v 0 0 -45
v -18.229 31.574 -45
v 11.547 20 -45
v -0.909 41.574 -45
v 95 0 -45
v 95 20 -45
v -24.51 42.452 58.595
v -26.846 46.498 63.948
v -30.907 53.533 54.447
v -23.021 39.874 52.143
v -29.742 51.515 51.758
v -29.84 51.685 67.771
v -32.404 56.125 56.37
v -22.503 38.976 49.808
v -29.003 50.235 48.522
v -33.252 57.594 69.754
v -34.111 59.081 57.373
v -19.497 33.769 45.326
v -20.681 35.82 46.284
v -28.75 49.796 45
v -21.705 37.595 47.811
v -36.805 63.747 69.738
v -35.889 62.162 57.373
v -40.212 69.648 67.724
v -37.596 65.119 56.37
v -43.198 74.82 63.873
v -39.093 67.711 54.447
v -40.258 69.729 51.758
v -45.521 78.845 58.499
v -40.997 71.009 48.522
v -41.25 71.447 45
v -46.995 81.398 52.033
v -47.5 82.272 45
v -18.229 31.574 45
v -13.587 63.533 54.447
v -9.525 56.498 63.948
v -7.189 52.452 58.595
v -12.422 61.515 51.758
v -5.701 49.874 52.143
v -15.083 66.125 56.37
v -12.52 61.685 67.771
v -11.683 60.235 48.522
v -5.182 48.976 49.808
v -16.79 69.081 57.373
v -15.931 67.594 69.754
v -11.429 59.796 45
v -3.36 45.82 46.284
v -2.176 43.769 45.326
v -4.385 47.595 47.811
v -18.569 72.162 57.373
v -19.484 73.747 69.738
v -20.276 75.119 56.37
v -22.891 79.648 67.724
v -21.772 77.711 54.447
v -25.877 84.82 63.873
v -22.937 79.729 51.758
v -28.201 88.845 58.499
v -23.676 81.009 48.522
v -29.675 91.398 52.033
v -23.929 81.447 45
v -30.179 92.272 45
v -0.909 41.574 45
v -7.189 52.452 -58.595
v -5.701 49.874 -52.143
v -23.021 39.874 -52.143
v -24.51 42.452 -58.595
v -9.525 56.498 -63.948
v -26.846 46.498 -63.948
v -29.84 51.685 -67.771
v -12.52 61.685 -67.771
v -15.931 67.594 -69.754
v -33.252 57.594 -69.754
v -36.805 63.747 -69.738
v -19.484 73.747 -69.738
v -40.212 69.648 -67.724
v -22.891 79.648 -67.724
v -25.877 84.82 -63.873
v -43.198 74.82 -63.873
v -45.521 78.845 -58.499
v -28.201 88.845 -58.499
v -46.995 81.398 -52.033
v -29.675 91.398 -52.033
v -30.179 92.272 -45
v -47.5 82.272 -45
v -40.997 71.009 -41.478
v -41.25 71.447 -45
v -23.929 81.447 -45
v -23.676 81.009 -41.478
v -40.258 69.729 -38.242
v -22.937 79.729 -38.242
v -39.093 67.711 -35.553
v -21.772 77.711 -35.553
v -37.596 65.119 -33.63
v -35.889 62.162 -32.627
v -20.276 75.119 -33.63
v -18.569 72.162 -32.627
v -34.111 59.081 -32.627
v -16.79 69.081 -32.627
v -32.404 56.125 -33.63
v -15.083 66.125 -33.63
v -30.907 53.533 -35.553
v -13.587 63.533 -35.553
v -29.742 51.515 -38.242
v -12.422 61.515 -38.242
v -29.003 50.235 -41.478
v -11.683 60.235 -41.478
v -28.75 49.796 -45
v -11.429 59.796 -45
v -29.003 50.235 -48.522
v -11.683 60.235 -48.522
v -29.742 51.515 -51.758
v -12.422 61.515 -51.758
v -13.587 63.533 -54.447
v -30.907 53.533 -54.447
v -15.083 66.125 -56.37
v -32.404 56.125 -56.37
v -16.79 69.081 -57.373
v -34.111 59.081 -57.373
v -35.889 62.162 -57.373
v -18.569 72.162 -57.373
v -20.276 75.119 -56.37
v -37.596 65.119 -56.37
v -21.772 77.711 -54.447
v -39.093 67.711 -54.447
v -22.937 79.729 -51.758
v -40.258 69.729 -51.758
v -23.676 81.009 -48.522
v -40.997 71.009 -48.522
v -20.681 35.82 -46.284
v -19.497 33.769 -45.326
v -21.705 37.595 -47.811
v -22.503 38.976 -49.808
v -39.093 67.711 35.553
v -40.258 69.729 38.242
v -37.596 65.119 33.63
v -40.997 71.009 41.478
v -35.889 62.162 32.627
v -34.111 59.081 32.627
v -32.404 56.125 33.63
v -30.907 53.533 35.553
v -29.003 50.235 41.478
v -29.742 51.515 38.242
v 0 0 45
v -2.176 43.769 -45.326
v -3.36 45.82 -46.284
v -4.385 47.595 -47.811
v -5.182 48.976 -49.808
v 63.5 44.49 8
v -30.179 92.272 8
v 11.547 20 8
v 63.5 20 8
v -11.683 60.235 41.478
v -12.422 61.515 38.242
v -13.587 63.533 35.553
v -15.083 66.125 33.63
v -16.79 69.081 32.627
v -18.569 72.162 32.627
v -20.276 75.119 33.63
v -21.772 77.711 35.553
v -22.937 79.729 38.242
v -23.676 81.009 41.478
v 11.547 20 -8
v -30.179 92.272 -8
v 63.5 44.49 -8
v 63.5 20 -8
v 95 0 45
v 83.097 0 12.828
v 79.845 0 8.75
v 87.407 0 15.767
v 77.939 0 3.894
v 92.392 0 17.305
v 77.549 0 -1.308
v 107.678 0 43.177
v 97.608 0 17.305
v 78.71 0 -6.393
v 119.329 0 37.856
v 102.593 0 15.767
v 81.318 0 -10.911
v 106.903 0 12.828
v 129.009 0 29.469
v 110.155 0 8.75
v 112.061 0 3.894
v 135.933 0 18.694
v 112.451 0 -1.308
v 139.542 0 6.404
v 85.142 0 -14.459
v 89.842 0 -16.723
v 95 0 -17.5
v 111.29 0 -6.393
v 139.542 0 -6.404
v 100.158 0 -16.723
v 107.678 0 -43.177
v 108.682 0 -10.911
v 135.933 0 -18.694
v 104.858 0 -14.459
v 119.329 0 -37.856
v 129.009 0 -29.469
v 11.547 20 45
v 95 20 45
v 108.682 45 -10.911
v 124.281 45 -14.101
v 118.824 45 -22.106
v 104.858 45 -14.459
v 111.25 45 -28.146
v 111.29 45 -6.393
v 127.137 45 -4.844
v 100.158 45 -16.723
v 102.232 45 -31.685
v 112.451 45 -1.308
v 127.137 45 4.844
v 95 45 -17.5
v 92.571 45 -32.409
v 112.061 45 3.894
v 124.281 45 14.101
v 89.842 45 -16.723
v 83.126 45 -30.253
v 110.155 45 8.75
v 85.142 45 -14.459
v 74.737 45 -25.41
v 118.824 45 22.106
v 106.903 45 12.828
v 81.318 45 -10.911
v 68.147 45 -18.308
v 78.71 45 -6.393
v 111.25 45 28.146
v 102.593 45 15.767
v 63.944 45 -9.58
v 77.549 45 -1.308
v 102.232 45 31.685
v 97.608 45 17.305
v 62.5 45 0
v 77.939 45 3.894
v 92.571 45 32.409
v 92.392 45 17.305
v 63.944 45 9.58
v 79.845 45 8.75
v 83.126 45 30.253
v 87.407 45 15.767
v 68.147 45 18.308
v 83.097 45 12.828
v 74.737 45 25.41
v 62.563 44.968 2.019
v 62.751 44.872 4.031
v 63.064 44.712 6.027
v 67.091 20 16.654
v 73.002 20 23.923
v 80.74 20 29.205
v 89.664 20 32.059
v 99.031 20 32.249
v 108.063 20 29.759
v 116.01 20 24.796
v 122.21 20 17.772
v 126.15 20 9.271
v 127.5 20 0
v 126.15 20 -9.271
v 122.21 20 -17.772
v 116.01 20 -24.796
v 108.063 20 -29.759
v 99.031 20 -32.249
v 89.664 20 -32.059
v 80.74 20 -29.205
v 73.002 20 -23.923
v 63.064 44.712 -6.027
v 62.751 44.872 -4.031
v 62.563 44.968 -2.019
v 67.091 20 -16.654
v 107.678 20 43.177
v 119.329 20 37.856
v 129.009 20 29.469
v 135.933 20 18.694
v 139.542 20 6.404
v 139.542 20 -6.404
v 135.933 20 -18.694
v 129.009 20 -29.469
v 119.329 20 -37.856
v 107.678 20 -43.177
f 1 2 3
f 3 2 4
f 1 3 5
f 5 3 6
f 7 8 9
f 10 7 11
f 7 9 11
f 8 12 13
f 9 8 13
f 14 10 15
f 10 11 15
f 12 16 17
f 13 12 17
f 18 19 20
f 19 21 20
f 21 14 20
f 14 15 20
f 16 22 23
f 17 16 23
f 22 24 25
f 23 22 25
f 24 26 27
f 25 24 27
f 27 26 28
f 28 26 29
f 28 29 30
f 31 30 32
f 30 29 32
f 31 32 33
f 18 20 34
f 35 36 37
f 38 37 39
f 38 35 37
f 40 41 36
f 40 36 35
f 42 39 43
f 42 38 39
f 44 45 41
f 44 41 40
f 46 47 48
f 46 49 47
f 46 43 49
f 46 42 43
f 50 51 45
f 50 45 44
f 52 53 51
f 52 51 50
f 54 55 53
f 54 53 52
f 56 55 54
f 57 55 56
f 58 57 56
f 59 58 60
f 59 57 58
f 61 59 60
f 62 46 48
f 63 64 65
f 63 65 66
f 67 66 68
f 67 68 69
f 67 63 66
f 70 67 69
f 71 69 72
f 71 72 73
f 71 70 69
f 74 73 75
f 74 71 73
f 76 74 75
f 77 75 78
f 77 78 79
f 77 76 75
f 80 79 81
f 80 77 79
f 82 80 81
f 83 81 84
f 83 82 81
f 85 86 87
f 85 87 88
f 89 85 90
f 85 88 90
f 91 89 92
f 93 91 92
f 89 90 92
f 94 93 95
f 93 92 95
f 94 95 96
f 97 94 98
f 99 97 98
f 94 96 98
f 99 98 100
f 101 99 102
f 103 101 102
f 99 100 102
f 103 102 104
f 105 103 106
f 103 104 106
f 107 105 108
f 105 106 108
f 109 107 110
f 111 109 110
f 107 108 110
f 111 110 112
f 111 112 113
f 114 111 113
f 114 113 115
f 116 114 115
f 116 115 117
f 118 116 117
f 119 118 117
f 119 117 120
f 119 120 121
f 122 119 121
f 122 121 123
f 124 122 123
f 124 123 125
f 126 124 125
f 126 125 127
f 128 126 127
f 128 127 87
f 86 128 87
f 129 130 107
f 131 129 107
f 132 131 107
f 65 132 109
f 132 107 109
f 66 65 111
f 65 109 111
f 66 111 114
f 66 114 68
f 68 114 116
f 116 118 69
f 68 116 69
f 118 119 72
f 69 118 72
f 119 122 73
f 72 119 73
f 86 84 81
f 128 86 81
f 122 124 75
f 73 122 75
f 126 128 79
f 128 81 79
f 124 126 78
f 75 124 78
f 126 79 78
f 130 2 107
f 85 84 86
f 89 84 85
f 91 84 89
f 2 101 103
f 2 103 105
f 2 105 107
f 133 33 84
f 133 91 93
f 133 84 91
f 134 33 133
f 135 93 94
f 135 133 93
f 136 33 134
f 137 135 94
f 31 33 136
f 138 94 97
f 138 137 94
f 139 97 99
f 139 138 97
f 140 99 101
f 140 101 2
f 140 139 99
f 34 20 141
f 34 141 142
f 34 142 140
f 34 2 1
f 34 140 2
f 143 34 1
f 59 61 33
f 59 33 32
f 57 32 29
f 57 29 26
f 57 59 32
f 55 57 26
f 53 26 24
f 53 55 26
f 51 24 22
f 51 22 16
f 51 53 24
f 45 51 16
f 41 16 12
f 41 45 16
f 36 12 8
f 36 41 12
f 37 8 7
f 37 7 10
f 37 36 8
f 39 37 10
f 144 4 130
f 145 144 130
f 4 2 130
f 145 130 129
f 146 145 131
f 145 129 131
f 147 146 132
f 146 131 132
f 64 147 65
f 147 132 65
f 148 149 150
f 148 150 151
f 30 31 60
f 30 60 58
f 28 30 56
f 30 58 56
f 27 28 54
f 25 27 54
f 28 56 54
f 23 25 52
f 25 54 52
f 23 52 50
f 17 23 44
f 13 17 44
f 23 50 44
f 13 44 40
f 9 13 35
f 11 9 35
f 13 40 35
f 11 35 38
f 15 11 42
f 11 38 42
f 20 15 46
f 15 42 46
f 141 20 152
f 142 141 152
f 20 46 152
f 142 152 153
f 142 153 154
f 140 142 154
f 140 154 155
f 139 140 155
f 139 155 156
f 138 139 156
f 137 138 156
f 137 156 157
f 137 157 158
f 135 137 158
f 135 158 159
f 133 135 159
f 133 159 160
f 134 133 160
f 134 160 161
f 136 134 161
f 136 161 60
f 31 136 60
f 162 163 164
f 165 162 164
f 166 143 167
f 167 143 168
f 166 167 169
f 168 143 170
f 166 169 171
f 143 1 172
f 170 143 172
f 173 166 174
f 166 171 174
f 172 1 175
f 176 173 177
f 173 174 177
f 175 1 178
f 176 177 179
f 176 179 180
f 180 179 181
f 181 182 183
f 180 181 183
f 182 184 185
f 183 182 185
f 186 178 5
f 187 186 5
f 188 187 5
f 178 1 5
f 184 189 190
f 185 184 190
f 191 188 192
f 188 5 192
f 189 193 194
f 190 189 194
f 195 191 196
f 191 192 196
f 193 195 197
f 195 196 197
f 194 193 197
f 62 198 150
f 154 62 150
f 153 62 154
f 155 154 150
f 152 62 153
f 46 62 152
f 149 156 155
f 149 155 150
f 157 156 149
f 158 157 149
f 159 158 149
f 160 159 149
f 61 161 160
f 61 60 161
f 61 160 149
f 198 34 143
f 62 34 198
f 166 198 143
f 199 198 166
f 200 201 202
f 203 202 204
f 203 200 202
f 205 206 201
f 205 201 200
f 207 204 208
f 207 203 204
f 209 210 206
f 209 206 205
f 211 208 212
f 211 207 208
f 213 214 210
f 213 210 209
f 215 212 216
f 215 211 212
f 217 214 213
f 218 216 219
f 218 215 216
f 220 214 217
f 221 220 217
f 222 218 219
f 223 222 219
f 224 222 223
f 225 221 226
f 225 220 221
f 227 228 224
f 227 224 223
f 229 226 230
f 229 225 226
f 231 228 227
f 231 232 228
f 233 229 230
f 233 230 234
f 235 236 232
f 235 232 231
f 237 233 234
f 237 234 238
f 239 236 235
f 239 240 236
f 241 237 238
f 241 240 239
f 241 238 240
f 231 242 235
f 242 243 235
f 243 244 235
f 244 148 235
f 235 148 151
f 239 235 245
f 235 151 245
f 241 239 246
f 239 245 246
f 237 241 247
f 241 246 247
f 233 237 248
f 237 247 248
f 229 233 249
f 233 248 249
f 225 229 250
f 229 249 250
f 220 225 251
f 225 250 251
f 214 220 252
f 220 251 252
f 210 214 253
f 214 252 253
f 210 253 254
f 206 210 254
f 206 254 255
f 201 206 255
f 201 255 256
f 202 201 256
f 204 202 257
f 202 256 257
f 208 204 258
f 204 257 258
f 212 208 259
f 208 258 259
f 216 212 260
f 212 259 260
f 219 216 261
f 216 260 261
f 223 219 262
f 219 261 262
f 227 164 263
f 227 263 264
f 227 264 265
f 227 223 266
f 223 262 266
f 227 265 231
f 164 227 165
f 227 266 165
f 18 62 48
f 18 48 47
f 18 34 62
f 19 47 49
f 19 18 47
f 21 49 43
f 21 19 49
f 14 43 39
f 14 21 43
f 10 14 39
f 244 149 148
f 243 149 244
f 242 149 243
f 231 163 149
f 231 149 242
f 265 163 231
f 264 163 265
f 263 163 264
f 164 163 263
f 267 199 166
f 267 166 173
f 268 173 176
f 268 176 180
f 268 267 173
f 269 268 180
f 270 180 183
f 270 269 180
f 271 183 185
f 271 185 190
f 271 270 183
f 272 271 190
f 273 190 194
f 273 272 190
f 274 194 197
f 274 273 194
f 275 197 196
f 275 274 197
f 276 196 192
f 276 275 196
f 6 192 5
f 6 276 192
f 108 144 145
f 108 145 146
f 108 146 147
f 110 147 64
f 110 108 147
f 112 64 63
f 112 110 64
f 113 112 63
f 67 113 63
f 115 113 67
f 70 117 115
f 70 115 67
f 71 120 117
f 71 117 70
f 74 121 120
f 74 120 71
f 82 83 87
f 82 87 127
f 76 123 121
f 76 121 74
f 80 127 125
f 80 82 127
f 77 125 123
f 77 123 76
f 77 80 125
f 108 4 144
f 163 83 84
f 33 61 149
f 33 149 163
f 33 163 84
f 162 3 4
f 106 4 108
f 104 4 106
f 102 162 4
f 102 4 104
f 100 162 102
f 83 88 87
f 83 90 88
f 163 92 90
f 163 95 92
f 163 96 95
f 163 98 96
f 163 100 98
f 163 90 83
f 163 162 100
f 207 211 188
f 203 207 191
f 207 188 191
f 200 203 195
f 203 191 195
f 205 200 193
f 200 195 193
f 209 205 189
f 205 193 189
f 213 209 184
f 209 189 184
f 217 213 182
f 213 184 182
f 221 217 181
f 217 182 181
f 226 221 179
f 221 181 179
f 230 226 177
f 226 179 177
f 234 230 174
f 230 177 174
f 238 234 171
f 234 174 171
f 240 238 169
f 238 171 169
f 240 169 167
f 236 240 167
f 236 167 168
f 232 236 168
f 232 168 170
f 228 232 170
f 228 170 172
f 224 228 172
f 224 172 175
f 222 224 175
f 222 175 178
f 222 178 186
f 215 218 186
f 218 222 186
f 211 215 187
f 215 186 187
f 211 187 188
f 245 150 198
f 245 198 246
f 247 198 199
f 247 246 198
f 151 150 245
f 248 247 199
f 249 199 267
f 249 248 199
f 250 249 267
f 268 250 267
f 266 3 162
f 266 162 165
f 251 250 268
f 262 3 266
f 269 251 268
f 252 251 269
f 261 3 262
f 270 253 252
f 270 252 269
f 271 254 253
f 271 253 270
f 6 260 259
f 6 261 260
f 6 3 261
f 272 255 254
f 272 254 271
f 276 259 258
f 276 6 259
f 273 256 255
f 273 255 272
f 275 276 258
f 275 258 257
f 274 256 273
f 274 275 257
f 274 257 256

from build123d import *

# Parameters (mm, degrees)
BOSS_EXTRUDE1_DEPTH = 45
BOSS_EXTRUDE2_DEPTH = 20
SKETCH3_R           = 12.5
CUT_EXTRUDE1_DEPTH  = 20
BOSS_EXTRUDE3_DEPTH = 20
SKETCH5_R           = 32.5
SKETCH5_R_2         = 17.5
BOSS_EXTRUDE4_DEPTH = 25
FILLET1_R           = 10
SKETCH8_R           = 17.5
CUT_EXTRUDE2_DEPTH  = 182.698096488
RIB2_REACH          = 183.698
SKETCH9_WALL_W      = 469.435460986
SKETCH9_WALL_H      = 16


with BuildPart() as part:
    # Sketch1 → Boss-Extrude1 (new, symmetric)
    with BuildSketch(Plane.XY):
        Polygon((0, 0), (95, 0), (95, 20), (11.547005384, 20), (-30.179491924, 92.27241336), (-47.5, 82.27241336), align=None)
    extrude(amount=BOSS_EXTRUDE1_DEPTH, both=True)

    # Sketch2 → Boss-Extrude2 (add)
    with BuildSketch(Plane(origin=(17.320508076, 10, 0), x_dir=(0, 0, -1), z_dir=(0.8660254037844396, 0.4999999999999982, 0))):
        with BuildLine():
            Line((-45, 70), (-45, 95))
            ThreePointArc((-45, 95), (-70, 70), (-45, 45))
            Line((-45, 45), (-45, 70))
        make_face()
        with BuildLine():
            ThreePointArc((45, 45), (70, 70), (45, 95))
            Line((45, 95), (45, 45))
        make_face()
    extrude(amount=-BOSS_EXTRUDE2_DEPTH)

    # Sketch3 → Cut-Extrude1 (cut)
    with BuildSketch(Plane(origin=(17.320508076, 10, 0), x_dir=(0, 0, -1), z_dir=(0.8660254037844396, 0.4999999999999982, 0))):
        with Locations(Location((-45, 70, 0), (0, 0, 90))):
            Circle(SKETCH3_R)
        with Locations(Location((45, 70, 0), (0, 0, 90))):
            Circle(SKETCH3_R)
    extrude(amount=-CUT_EXTRUDE1_DEPTH, mode=Mode.SUBTRACT)

    # Sketch4 → Boss-Extrude3 (add)
    with BuildSketch(Plane(origin=(0, 20, 0), x_dir=(1, 0, 0), z_dir=(0, 1, 0))):
        with BuildLine():
            Line((95, 45), (95, -45))
            ThreePointArc((95, -45), (140, 0), (95, 45))
        make_face()
    extrude(amount=-BOSS_EXTRUDE3_DEPTH)

    # Sketch5 → Boss-Extrude4 (add)
    with BuildSketch(Plane(origin=(0, 20, 0), x_dir=(1, 0, 0), z_dir=(0, 1, 0))):
        with Locations(Location((95, 0, 0), (0, 0, 180))):
            Circle(SKETCH5_R)
        with Locations(Location((95, 0, 0), (0, 0, 180))):
            Circle(SKETCH5_R_2, mode=Mode.SUBTRACT)
    extrude(amount=BOSS_EXTRUDE4_DEPTH)

    # Fillet1
    fillet1_edges = [part.edges().sort_by_distance(p)[0] for p in [
        (-13.839745962, 43.97114317, 45),
        (-13.839745962, 43.97114317, -45),
    ]]
    fillet(fillet1_edges, radius=FILLET1_R)

    # Sketch8 → Cut-Extrude2 (cut, through all)
    with BuildSketch(Plane(origin=(0, 0, 0), x_dir=(-1, 0, 0), z_dir=(0, -1, 0))):
        with Locations(Location((-95, 0, 0), (0, 0, 90))):
            Circle(SKETCH8_R)
    extrude(amount=-CUT_EXTRUDE2_DEPTH, mode=Mode.SUBTRACT)

    # Sketch9 wall → Rib2 (add, up to next)
    with BuildSketch(Plane(origin=(16.160254038, 68.63620668, 0), x_dir=(0.890812610433, -0.45437087615, 0), z_dir=(0.45437087615, 0.890812610433, 0)), mode=Mode.PRIVATE) as rib2_sk1:
        Rectangle(SKETCH9_WALL_W, SKETCH9_WALL_H)
    rib2_tool1 = extrude(rib2_sk1.sketch, amount=-RIB2_REACH, mode=Mode.PRIVATE) - part.part
    add(rib2_tool1.solids().sort_by_distance((16.160254038, 68.63620668, 0))[0])


solid = part.part
